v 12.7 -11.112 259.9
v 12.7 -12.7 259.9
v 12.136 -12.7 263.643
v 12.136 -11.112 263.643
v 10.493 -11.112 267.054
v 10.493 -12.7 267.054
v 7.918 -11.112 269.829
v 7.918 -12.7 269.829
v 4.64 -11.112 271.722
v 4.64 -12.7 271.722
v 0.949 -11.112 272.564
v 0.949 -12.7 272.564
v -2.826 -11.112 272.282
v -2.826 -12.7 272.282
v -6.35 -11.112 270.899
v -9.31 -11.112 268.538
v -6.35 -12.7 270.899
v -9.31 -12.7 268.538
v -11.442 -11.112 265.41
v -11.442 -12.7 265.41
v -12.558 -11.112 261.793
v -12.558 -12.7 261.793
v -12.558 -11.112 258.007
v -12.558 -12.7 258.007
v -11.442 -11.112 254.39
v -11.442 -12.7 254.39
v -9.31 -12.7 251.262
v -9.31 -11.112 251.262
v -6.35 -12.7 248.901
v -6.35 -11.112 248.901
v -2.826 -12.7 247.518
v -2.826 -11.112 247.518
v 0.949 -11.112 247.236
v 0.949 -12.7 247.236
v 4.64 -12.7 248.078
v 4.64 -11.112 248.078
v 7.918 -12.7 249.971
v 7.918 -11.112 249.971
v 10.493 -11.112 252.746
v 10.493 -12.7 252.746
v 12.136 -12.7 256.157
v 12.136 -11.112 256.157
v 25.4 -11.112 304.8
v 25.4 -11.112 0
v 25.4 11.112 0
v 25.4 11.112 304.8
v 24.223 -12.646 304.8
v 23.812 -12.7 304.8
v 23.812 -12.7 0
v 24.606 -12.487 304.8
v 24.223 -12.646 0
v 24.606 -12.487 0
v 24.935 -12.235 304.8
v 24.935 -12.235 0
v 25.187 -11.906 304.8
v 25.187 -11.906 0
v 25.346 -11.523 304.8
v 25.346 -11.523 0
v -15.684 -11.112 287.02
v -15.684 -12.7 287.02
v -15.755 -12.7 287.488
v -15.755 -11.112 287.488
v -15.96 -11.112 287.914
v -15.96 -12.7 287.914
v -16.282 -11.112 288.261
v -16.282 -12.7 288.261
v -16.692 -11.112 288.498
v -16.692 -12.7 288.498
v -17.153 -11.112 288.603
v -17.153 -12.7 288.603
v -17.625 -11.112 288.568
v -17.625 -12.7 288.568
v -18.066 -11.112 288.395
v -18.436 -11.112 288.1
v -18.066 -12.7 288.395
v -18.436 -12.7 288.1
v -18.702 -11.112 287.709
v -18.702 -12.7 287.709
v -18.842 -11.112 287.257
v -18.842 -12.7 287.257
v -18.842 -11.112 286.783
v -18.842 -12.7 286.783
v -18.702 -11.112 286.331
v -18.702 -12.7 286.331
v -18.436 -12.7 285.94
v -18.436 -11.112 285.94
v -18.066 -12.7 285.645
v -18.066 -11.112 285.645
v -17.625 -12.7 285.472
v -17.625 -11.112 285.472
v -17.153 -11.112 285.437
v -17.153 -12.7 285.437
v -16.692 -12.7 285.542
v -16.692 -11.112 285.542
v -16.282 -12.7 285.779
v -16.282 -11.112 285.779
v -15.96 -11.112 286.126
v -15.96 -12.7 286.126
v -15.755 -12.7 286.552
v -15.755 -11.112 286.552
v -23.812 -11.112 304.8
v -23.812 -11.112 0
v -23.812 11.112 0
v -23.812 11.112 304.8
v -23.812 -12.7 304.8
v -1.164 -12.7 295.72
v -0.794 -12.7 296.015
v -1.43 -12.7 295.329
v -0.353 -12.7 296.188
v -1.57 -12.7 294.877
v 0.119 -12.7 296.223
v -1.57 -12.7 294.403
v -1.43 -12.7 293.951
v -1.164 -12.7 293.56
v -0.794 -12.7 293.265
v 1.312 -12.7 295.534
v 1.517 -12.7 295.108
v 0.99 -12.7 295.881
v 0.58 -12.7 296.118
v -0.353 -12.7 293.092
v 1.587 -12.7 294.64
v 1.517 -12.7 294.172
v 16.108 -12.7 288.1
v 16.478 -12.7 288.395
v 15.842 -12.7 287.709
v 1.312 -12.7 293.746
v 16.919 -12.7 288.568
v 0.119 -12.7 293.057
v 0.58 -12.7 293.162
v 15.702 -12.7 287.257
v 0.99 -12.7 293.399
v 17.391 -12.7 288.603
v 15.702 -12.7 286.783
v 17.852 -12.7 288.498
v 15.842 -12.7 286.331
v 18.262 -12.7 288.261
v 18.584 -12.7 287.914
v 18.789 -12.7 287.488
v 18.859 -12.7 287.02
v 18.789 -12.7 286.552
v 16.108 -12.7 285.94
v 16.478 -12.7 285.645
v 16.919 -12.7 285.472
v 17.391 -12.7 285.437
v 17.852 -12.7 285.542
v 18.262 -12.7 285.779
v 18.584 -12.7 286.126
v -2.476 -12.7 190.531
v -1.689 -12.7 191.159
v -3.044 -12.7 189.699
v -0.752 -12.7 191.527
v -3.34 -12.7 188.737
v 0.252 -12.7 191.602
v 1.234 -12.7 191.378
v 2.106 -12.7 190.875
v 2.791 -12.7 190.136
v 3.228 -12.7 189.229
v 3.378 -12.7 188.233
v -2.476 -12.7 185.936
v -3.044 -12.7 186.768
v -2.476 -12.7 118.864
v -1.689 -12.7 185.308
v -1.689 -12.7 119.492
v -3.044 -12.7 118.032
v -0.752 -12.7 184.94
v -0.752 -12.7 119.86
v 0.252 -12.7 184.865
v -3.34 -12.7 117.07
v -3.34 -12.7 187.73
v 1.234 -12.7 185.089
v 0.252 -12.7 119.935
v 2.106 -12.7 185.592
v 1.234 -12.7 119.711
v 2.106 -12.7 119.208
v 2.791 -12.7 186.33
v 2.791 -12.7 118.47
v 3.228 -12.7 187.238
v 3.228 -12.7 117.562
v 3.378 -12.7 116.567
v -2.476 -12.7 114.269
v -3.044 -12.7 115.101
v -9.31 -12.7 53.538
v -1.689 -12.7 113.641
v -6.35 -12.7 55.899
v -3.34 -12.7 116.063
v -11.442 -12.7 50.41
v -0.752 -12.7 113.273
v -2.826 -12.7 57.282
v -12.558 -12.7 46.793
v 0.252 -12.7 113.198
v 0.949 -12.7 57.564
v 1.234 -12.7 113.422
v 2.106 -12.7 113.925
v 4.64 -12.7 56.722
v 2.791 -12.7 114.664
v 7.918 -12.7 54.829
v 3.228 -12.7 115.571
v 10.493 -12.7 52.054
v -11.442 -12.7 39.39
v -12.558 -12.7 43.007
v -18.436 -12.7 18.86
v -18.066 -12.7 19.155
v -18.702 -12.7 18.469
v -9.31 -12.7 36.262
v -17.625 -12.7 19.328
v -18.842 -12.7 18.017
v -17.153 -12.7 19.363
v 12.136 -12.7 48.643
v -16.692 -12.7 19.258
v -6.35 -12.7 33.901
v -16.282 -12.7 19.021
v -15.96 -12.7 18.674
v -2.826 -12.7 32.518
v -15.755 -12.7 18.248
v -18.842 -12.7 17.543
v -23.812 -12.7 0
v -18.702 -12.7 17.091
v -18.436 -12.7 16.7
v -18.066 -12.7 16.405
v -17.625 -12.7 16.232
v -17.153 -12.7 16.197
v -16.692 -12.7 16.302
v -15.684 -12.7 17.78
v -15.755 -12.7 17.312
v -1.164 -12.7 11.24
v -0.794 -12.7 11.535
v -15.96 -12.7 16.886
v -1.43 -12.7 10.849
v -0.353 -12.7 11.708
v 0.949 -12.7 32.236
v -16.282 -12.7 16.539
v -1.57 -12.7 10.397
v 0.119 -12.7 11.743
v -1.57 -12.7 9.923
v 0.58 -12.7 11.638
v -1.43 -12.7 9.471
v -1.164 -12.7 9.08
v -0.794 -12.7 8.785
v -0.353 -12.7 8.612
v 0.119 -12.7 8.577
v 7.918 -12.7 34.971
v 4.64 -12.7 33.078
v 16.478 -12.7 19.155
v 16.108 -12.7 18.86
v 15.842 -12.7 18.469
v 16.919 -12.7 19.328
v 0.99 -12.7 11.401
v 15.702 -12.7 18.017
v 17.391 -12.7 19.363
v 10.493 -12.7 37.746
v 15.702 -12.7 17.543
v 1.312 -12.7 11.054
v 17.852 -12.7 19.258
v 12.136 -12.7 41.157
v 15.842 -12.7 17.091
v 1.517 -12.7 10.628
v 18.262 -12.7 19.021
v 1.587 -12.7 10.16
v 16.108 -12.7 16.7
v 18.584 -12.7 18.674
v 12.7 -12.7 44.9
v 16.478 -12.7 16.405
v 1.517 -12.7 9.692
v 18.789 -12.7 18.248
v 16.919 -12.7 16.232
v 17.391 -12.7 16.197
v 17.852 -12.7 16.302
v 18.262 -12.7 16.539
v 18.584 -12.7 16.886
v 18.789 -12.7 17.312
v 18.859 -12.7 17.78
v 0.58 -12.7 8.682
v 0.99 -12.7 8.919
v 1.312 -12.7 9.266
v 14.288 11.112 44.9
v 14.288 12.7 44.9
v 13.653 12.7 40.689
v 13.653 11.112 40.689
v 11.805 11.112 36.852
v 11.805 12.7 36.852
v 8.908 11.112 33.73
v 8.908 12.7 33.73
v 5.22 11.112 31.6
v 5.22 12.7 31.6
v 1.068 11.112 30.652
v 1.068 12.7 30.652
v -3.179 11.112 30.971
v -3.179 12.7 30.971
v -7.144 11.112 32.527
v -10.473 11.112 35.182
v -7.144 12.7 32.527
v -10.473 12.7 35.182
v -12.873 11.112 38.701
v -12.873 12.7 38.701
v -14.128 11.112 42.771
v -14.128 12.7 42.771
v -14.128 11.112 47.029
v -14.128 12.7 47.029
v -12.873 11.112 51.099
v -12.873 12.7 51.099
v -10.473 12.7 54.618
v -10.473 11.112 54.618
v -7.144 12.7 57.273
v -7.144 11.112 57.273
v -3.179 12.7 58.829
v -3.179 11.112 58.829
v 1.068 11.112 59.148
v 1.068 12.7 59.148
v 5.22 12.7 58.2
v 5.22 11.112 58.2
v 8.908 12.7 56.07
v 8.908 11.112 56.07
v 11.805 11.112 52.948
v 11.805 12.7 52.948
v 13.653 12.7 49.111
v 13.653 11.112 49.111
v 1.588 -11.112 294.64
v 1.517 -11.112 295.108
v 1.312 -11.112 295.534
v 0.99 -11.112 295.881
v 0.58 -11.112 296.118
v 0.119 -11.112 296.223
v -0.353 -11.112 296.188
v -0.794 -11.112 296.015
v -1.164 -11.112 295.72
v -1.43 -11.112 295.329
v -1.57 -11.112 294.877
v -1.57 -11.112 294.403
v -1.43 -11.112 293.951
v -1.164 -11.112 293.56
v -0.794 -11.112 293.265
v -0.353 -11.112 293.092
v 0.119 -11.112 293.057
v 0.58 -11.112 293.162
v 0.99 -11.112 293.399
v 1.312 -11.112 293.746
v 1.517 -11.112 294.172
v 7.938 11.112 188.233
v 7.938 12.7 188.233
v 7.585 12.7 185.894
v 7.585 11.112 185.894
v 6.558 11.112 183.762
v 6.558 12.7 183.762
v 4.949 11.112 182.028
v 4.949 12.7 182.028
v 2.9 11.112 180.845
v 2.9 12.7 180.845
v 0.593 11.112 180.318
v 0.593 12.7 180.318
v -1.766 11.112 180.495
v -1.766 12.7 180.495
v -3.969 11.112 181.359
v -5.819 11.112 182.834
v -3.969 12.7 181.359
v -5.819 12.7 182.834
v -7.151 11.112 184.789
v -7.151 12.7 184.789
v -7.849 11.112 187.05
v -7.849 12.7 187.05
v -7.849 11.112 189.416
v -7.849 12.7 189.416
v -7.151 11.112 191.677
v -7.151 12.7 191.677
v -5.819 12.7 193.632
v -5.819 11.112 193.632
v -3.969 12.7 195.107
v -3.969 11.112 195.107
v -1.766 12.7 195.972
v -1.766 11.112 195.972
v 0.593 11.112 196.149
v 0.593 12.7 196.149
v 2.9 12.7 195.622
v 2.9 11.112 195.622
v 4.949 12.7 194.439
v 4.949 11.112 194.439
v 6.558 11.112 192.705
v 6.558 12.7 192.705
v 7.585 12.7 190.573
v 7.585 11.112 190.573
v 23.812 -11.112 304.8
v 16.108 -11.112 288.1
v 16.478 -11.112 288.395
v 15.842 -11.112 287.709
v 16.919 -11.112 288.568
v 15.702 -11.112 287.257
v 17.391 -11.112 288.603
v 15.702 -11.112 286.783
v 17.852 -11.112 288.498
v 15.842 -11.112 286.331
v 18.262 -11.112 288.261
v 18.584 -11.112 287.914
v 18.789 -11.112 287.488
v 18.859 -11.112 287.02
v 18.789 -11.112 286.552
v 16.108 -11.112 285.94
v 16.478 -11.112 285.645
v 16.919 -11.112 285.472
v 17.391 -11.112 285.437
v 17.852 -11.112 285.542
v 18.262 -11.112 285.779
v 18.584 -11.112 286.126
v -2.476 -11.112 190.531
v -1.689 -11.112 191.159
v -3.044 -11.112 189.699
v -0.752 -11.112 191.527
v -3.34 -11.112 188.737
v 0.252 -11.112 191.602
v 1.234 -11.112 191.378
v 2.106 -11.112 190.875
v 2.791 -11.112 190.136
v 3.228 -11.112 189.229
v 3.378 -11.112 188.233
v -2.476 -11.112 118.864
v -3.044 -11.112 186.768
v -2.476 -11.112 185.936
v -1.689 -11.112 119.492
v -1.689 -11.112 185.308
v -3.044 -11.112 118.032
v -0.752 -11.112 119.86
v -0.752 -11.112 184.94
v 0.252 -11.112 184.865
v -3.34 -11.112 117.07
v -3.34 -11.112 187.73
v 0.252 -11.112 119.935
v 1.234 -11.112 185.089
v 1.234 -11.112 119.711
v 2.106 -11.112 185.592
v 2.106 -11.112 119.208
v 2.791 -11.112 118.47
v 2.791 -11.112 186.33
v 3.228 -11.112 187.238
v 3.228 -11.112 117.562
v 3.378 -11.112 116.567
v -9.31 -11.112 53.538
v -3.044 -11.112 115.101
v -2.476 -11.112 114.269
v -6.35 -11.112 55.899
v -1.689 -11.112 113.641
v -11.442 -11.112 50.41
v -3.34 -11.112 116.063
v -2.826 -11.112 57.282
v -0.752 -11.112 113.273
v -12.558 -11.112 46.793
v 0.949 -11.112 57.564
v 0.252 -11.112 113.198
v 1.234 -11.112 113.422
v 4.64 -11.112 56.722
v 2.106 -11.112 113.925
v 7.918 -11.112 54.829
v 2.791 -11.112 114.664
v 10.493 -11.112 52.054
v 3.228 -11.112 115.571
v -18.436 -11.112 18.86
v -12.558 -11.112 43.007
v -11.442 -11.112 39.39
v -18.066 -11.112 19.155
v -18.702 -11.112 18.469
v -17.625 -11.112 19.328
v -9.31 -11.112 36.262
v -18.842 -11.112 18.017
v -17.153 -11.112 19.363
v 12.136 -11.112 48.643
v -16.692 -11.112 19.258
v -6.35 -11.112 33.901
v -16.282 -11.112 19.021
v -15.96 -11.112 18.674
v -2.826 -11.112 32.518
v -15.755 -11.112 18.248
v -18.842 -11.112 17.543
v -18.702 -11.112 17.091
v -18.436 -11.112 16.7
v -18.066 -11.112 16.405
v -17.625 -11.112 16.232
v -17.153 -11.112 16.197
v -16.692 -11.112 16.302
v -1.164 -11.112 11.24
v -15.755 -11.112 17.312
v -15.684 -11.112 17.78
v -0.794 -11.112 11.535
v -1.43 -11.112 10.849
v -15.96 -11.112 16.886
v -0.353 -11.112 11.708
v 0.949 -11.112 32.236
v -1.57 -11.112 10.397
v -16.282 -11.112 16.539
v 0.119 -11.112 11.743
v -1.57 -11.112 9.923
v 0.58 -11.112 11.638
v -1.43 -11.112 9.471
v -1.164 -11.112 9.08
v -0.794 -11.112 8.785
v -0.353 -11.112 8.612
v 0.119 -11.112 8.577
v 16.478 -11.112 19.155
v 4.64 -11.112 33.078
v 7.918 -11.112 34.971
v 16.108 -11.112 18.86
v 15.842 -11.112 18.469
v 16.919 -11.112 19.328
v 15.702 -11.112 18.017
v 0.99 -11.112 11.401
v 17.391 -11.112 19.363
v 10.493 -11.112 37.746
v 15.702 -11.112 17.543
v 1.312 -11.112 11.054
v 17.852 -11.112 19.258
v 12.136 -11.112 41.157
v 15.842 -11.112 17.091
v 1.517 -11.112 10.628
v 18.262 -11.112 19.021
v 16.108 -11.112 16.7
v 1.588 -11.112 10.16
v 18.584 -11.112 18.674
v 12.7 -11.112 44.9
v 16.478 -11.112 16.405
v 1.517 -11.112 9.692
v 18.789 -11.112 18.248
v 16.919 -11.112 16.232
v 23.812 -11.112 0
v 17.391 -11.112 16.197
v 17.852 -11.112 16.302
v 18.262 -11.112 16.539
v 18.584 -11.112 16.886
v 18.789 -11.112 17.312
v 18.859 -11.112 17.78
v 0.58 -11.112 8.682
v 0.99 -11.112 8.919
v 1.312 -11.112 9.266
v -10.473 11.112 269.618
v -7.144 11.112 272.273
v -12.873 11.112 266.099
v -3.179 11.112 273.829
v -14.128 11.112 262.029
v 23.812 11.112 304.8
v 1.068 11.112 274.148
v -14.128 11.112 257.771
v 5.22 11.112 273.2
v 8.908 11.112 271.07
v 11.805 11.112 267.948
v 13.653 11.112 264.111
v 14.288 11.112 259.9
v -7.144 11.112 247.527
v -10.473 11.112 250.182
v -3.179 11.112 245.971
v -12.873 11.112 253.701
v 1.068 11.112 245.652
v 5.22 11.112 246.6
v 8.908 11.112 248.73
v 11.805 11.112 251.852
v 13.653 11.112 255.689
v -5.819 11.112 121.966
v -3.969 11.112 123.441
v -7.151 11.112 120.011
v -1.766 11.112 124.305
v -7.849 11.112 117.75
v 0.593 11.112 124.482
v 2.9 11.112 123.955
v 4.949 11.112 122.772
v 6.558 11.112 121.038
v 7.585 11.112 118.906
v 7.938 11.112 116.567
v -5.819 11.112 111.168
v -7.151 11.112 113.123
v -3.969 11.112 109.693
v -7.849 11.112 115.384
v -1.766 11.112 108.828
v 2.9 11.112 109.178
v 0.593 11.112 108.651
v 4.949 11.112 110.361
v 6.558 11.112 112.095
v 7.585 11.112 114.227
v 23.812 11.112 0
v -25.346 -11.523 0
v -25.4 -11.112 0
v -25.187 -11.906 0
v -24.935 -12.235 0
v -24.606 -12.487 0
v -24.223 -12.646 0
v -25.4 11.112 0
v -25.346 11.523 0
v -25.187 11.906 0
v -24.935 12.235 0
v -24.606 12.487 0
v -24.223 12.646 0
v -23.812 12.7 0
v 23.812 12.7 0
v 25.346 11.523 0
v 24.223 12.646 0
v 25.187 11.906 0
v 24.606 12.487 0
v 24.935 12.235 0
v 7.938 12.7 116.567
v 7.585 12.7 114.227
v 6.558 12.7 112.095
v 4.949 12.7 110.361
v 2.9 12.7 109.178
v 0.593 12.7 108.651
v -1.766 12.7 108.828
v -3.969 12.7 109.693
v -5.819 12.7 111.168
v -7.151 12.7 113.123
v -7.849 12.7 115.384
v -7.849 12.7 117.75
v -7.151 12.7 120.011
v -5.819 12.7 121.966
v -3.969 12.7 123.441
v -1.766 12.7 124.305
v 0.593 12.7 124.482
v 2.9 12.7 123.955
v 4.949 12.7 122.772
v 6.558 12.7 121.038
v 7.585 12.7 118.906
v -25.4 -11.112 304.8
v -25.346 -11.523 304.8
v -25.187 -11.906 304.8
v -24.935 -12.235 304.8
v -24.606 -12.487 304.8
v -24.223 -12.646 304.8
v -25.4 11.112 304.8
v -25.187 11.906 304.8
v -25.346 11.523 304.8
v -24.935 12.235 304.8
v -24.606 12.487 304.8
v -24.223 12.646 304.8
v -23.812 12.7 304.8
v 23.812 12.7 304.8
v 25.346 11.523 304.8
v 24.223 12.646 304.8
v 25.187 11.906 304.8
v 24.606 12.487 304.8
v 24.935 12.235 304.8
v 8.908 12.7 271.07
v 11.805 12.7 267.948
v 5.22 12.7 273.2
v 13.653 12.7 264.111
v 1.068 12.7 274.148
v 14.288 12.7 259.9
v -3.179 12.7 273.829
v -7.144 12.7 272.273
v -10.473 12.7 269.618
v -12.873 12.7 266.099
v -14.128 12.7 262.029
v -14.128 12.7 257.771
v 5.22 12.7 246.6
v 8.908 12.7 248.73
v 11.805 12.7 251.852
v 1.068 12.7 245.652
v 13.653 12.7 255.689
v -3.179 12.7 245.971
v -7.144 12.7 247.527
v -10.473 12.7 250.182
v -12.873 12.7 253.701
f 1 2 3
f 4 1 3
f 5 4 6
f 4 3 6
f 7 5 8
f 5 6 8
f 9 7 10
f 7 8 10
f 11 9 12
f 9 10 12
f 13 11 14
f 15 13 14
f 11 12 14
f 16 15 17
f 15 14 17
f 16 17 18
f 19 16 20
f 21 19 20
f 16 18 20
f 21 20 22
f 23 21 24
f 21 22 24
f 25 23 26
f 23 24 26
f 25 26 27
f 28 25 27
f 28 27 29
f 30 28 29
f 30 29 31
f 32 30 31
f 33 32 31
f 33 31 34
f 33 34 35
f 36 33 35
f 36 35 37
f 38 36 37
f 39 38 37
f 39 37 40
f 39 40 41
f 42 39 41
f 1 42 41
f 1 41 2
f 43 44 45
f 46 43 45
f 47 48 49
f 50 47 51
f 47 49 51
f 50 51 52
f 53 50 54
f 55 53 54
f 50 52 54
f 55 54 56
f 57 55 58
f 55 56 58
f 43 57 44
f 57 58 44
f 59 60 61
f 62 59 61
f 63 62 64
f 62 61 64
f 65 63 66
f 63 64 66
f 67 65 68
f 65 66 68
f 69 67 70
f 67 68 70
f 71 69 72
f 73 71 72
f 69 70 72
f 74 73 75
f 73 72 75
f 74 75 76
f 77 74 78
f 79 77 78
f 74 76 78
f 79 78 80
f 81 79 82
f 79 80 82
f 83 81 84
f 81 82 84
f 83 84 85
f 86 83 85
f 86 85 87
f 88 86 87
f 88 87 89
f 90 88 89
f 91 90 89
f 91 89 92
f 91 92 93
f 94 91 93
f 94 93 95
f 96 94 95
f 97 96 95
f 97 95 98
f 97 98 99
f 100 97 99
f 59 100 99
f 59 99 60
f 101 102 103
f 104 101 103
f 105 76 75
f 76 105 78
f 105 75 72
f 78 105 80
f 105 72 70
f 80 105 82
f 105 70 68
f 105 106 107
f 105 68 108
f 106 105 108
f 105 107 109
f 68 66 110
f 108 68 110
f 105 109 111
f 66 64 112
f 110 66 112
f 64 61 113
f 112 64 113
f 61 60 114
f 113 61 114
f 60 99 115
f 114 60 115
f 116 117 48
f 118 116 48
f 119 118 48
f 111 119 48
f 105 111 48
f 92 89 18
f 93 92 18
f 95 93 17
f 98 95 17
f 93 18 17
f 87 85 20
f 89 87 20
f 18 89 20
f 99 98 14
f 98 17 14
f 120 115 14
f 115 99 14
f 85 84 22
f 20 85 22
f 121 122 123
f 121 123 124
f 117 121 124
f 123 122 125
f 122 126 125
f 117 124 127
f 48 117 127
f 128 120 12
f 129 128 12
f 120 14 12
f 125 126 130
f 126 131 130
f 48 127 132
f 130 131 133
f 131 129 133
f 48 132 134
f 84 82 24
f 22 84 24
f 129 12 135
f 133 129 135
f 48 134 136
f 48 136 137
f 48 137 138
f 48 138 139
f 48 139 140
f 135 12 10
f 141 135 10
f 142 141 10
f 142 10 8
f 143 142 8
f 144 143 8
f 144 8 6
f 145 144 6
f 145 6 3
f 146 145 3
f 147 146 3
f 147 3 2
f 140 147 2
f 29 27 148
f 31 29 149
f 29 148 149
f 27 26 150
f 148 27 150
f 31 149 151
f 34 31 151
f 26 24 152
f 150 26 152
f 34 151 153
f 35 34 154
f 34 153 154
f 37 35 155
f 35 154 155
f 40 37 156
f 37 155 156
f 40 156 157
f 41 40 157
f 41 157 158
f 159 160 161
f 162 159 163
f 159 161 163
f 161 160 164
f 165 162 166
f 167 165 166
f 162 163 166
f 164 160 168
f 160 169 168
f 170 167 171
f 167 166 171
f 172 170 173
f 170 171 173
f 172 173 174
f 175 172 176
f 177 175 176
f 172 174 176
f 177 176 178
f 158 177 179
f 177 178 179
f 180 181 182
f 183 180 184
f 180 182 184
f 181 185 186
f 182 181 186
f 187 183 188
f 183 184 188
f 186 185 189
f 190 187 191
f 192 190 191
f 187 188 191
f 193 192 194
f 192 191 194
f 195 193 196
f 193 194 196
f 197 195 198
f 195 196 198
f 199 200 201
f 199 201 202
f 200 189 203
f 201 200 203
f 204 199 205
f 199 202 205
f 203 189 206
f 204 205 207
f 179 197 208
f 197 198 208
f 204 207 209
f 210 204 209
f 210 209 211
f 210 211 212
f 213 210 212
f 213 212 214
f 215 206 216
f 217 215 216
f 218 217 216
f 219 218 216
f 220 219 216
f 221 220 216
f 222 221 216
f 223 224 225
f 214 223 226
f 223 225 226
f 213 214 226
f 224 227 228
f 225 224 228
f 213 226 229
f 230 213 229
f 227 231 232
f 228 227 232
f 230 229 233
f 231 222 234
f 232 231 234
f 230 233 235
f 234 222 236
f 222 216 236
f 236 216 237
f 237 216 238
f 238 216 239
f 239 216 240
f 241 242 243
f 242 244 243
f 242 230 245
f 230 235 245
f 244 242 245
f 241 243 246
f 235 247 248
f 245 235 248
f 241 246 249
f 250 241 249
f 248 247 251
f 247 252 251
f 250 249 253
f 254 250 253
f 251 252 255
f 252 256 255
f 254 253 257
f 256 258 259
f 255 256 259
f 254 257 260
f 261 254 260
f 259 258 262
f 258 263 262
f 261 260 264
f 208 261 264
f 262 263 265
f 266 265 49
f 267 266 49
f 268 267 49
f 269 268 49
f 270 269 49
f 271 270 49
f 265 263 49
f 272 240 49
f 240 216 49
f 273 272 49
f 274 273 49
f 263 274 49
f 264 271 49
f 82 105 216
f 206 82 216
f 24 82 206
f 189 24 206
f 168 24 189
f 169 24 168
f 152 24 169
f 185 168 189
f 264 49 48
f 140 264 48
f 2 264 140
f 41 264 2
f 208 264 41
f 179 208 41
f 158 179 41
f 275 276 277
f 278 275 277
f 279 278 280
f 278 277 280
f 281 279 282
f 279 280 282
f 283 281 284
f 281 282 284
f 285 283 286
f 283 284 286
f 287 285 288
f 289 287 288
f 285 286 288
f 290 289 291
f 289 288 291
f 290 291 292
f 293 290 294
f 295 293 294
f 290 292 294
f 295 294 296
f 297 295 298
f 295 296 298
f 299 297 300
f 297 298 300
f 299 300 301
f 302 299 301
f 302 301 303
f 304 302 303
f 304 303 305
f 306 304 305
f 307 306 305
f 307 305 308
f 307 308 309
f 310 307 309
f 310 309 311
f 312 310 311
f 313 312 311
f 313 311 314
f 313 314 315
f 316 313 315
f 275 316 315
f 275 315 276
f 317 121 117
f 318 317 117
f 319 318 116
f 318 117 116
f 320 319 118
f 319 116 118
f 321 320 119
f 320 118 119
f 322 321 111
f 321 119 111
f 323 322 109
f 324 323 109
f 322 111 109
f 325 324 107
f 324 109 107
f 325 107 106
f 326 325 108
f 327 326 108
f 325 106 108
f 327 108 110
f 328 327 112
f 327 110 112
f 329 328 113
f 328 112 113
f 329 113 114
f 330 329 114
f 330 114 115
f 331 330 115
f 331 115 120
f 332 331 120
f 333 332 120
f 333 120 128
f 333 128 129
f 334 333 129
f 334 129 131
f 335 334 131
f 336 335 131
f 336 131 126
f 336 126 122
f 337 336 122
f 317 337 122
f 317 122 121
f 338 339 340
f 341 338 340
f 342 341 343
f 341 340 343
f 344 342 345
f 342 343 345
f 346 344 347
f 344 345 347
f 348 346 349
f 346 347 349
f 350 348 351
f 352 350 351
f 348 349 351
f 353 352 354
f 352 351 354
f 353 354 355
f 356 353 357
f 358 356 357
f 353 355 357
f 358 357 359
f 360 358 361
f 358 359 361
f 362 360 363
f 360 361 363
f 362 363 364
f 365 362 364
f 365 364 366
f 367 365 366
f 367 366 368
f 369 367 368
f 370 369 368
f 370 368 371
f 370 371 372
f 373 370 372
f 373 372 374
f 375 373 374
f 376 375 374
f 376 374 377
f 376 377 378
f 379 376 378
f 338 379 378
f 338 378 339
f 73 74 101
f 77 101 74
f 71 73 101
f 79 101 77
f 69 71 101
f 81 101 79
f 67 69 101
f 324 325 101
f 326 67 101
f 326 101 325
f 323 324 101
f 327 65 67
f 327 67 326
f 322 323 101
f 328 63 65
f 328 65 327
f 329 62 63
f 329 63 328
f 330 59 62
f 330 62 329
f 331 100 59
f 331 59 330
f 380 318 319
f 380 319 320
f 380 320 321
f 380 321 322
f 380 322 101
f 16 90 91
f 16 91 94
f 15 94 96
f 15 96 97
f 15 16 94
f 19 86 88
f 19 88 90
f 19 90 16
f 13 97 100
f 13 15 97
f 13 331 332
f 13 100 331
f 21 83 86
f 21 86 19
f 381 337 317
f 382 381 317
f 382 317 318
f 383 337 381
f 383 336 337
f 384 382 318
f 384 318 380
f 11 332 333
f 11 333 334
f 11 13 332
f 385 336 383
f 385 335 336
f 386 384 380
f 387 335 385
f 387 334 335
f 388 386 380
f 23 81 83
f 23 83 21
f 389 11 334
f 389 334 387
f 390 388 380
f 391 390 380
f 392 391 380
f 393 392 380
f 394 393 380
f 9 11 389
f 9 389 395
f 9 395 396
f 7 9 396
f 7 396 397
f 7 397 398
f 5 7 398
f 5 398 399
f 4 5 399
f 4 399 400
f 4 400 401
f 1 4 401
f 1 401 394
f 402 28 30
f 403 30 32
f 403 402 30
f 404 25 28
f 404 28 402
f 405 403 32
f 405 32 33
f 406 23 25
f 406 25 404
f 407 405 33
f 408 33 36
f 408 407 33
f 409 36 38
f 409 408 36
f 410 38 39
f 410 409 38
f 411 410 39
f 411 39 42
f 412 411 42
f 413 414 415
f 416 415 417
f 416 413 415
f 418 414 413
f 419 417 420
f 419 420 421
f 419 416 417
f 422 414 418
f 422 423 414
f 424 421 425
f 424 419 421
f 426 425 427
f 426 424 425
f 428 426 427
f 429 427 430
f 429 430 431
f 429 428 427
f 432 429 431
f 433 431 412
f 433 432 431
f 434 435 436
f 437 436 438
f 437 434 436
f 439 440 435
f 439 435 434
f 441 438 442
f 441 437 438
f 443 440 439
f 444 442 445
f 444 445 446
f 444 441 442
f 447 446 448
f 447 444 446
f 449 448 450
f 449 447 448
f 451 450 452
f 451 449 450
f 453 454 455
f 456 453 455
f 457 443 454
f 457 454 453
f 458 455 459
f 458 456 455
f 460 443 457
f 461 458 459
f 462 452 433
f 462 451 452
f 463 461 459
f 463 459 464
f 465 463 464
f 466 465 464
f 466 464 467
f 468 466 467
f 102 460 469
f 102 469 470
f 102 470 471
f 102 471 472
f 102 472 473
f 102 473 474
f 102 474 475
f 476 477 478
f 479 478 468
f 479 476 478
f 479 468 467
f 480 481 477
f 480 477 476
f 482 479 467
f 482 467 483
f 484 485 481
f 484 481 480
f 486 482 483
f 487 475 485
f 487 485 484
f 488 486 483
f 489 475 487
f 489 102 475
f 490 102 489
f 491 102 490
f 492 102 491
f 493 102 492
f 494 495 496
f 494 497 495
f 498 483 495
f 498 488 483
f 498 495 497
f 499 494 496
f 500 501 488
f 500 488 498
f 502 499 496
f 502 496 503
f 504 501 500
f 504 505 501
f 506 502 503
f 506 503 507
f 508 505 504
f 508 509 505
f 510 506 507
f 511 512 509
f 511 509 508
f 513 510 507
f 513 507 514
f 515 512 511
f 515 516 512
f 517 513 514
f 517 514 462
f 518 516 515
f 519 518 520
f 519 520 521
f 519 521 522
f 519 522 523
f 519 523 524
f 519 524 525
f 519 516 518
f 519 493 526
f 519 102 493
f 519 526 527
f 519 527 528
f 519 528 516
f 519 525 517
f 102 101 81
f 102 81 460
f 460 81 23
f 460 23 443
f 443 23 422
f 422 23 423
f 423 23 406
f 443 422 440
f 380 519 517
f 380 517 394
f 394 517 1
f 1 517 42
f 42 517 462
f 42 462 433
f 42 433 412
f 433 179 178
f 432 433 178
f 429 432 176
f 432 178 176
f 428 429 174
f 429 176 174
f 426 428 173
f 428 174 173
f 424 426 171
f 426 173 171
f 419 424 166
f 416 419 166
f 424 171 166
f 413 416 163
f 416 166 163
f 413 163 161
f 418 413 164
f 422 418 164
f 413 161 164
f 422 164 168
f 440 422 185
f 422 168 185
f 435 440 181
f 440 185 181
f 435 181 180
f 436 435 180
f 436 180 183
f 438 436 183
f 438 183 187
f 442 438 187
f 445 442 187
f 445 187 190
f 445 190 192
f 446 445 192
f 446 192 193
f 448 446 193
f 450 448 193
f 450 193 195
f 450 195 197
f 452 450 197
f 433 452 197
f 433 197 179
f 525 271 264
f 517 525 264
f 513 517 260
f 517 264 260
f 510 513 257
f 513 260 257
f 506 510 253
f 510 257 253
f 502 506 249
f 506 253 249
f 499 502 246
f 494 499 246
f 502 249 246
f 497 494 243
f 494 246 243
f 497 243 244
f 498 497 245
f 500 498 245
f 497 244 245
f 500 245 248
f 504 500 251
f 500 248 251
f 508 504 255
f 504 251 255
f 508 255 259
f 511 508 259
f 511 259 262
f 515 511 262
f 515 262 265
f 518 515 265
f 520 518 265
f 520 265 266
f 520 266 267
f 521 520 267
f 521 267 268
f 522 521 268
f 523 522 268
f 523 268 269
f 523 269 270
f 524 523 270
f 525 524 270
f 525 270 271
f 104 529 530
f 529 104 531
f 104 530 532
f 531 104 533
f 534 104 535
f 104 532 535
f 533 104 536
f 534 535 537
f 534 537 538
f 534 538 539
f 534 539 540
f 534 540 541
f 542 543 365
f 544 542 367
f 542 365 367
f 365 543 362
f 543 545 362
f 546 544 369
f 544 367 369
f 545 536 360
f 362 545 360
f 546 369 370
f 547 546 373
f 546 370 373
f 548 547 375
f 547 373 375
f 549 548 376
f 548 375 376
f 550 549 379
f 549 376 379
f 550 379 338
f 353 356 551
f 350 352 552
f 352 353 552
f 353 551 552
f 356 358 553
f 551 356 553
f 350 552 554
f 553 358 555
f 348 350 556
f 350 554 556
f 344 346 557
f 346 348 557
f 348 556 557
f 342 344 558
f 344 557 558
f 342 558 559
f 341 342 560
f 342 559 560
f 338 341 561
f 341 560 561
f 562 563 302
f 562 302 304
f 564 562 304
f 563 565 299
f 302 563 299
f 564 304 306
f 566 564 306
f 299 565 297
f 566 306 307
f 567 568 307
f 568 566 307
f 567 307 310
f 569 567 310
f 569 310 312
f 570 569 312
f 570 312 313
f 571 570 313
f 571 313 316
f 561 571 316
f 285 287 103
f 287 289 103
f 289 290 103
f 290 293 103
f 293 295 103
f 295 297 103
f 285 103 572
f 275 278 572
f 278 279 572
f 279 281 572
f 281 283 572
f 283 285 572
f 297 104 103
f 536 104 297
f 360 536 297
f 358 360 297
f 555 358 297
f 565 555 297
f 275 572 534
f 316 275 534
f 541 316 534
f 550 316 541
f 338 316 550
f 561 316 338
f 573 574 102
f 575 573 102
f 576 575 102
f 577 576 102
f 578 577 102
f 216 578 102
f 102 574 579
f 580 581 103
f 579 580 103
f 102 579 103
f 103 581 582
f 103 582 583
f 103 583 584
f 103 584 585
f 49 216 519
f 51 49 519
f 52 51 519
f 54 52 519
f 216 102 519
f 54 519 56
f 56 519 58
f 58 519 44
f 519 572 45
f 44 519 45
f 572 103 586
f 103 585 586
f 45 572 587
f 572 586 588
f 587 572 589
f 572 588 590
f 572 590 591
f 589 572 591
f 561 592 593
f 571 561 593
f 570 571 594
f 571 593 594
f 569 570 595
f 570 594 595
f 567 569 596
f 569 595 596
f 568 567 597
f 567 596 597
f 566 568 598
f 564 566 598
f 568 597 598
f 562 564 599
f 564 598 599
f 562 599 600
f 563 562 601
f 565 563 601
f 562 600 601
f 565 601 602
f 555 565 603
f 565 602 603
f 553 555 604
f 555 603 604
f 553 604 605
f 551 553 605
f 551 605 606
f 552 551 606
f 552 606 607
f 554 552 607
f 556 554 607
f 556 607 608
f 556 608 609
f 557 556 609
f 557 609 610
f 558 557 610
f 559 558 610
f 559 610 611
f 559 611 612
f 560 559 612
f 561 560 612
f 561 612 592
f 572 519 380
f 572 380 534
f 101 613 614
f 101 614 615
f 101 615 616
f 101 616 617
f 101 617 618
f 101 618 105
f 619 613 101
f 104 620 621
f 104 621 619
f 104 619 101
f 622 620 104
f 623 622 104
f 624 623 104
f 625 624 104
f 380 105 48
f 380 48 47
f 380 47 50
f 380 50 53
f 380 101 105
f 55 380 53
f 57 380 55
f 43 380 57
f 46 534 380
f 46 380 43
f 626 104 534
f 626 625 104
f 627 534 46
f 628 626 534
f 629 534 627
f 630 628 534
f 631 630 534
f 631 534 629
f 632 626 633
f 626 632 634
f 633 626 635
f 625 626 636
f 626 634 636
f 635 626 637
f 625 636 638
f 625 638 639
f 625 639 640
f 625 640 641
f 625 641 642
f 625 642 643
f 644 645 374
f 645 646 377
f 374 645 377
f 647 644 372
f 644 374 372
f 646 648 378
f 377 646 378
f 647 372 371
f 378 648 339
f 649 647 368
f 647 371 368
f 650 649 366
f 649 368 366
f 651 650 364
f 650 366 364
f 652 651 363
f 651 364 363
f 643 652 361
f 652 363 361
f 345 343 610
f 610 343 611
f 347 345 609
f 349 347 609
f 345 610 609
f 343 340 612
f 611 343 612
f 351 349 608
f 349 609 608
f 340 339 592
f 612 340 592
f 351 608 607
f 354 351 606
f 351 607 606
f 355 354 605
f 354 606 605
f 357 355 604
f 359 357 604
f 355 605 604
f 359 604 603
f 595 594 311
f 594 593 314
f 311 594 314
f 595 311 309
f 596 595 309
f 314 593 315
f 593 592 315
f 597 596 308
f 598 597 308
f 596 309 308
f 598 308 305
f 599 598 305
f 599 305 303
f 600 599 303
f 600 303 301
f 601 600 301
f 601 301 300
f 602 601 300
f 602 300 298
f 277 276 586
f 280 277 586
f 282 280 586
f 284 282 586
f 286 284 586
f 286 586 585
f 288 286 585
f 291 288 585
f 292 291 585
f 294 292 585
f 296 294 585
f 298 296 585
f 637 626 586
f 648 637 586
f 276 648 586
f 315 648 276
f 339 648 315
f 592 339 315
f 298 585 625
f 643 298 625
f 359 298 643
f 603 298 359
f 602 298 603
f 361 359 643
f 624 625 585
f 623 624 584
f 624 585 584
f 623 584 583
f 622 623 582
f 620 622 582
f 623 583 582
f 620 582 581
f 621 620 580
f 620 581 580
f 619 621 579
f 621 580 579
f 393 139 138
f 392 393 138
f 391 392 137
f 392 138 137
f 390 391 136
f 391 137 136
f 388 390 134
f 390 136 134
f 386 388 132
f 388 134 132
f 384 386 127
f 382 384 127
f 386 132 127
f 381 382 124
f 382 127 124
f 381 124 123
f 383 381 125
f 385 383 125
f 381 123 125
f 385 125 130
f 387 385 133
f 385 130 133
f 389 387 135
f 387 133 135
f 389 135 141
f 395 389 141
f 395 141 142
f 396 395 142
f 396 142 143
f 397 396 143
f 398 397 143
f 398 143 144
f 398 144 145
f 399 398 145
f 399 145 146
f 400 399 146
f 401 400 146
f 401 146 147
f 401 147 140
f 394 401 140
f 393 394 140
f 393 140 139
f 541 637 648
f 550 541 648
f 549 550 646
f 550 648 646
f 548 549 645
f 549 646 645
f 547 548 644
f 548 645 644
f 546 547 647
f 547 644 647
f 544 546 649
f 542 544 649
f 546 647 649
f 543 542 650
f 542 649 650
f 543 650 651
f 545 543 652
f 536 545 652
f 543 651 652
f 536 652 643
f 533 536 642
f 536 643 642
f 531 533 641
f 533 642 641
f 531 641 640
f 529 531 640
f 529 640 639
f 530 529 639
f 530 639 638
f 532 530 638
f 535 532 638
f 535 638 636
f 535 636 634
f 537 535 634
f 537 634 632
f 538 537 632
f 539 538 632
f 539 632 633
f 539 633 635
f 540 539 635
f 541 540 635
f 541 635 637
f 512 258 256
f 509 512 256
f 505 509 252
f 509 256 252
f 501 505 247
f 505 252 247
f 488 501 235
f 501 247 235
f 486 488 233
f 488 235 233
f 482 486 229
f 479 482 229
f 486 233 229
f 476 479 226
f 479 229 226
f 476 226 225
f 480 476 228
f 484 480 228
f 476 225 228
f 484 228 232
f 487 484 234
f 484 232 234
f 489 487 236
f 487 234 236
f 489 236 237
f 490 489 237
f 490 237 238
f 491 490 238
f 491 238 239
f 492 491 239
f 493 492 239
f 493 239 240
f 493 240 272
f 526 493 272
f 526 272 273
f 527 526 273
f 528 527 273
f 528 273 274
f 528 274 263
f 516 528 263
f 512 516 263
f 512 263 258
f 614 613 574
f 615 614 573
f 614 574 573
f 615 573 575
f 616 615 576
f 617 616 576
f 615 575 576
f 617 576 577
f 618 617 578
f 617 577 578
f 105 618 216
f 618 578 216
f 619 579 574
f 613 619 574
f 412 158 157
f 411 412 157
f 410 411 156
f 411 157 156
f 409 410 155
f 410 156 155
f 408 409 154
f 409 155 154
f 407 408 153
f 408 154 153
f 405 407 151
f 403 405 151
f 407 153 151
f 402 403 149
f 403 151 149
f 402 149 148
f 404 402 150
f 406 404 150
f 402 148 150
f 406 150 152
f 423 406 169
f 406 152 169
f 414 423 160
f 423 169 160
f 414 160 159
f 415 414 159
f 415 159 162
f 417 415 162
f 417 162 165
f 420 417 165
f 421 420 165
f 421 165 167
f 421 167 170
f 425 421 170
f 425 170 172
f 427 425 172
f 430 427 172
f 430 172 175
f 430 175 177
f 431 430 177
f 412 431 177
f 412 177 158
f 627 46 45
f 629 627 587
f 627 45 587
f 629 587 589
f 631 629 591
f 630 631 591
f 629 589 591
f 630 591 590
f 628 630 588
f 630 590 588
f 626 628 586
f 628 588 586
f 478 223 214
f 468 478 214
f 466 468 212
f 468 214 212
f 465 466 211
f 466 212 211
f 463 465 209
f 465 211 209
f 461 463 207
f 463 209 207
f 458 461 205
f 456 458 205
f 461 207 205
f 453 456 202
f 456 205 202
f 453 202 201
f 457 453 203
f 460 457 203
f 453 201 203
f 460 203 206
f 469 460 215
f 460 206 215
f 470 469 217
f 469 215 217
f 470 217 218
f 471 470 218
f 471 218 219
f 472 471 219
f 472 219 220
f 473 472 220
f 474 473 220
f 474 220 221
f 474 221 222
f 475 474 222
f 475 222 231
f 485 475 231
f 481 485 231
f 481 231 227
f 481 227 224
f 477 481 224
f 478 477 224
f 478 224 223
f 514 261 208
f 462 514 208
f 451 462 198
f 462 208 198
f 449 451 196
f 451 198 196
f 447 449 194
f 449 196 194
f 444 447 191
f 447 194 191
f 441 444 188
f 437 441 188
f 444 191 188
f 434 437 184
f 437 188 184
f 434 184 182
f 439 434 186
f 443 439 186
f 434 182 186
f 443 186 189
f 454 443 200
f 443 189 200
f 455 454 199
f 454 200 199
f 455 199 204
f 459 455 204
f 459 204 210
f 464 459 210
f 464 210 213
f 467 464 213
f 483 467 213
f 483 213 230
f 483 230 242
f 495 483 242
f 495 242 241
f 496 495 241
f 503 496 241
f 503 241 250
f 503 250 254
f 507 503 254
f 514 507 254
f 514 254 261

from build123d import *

# Parameters (mm, degrees)
SKETCH1_W                      = 47.625
SKETCH1_H                      = 22.225
BOSS_EXTRUDE1_DEPTH            = 304.8
CUT_EXTRUDE1_REACH             = 27.4
SKETCH2_R                      = 14.2875
CUT_EXTRUDE1_DIRECTION_2_DEPTH = 1
CUT_EXTRUDE2_REACH             = 27.4
SKETCH3_R                      = 12.7
CUT_EXTRUDE2_DIRECTION_2_DEPTH = 1
CUT_EXTRUDE5_REACH             = 27.4
SKETCH6_R                      = 3.3782
CUT_EXTRUDE5_DIRECTION_2_DEPTH = 1
CUT_EXTRUDE6_REACH             = 27.4
SKETCH7_R                      = 7.9375
CUT_EXTRUDE6_DIRECTION_2_DEPTH = 1
CUT_EXTRUDE7_REACH             = 27.4
SKETCH8_R                      = 1.5875
CUT_EXTRUDE7_DIRECTION_2_DEPTH = 1


with BuildPart() as part:
    # Sketch1 → Boss-Extrude1 (new body)
    with BuildSketch(Plane.XY):
        with BuildLine():
            Line((-23.8125, -12.7), (23.8125, -12.7))
            ThreePointArc((23.8125, -12.7), (24.935032015, -12.235032015), (25.4, -11.1125))
            Line((25.4, -11.1125), (25.4, 11.1125))
            ThreePointArc((25.4, 11.1125), (24.935032015, 12.235032015), (23.8125, 12.7))
            Line((23.8125, 12.7), (-23.8125, 12.7))
            ThreePointArc((-23.8125, 12.7), (-24.935032015, 12.235032015), (-25.4, 11.1125))
            Line((-25.4, 11.1125), (-25.4, -11.1125))
            ThreePointArc((-25.4, -11.1125), (-24.935032015, -12.235032015), (-23.8125, -12.7))
        make_face()
        Rectangle(SKETCH1_W, SKETCH1_H, mode=Mode.SUBTRACT)
    extrude(amount=BOSS_EXTRUDE1_DEPTH)

    # Sketch2 → Cut-Extrude1 (cut, up to next)
    with BuildSketch(Plane(origin=(0, 12.7, 0), x_dir=(1, 0, 0), z_dir=(0, 1, 0)), mode=Mode.PRIVATE) as cut_extrude1_sk1:
        with Locations((0, -259.9)):
            Circle(SKETCH2_R)
    cut_extrude1_tool1 = extrude(cut_extrude1_sk1.sketch, amount=-CUT_EXTRUDE1_REACH, mode=Mode.PRIVATE) & part.part
    add(cut_extrude1_tool1.solids().sort_by_distance((0, 12.7, 259.9))[0], mode=Mode.SUBTRACT)
    # Sketch2 → Cut-Extrude1 (cut, up to next)
    with BuildSketch(Plane(origin=(0, 12.7, 0), x_dir=(1, 0, 0), z_dir=(0, 1, 0)), mode=Mode.PRIVATE) as cut_extrude1_sk2:
        with Locations((0, -44.9)):
            Circle(SKETCH2_R)
    cut_extrude1_tool2 = extrude(cut_extrude1_sk2.sketch, amount=-CUT_EXTRUDE1_REACH, mode=Mode.PRIVATE) & part.part
    add(cut_extrude1_tool2.solids().sort_by_distance((0, 12.7, 44.9))[0], mode=Mode.SUBTRACT)

    # Sketch2 → Cut-Extrude1 direction 2 (cut)
    with BuildSketch(Plane(origin=(0, 12.7, 0), x_dir=(1, 0, 0), z_dir=(0, 1, 0))):
        with Locations((0, -259.9)):
            Circle(SKETCH2_R)
        with Locations((0, -44.9)):
            Circle(SKETCH2_R)
    extrude(amount=CUT_EXTRUDE1_DIRECTION_2_DEPTH, mode=Mode.SUBTRACT)

    # Sketch3 → Cut-Extrude2 (cut, up to next)
    with BuildSketch(Plane.XZ.offset(12.7), mode=Mode.PRIVATE) as cut_extrude2_sk1:
        with Locations((0, 44.9)):
            Circle(SKETCH3_R)
    cut_extrude2_tool1 = extrude(cut_extrude2_sk1.sketch, amount=-CUT_EXTRUDE2_REACH, mode=Mode.PRIVATE) & part.part
    add(cut_extrude2_tool1.solids().sort_by_distance((0, -12.7, 44.9))[0], mode=Mode.SUBTRACT)
    # Sketch3 → Cut-Extrude2 (cut, up to next)
    with BuildSketch(Plane.XZ.offset(12.7), mode=Mode.PRIVATE) as cut_extrude2_sk2:
        with Locations((0, 259.9)):
            Circle(SKETCH3_R)
    cut_extrude2_tool2 = extrude(cut_extrude2_sk2.sketch, amount=-CUT_EXTRUDE2_REACH, mode=Mode.PRIVATE) & part.part
    add(cut_extrude2_tool2.solids().sort_by_distance((0, -12.7, 259.9))[0], mode=Mode.SUBTRACT)

    # Sketch3 → Cut-Extrude2 direction 2 (cut)
    with BuildSketch(Plane.XZ.offset(12.7)):
        with Locations((0, 44.9)):
            Circle(SKETCH3_R)
        with Locations((0, 259.9)):
            Circle(SKETCH3_R)
    extrude(amount=CUT_EXTRUDE2_DIRECTION_2_DEPTH, mode=Mode.SUBTRACT)

    # Sketch6 → Cut-Extrude5 (cut, up to next)
    with BuildSketch(Plane.XZ.offset(12.7), mode=Mode.PRIVATE) as cut_extrude5_sk1:
        with Locations((0, 116.566667182)):
            Circle(SKETCH6_R)
    cut_extrude5_tool1 = extrude(cut_extrude5_sk1.sketch, amount=-CUT_EXTRUDE5_REACH, mode=Mode.PRIVATE) & part.part
    add(cut_extrude5_tool1.solids().sort_by_distance((0, -12.7, 116.566667))[0], mode=Mode.SUBTRACT)
    # Sketch6 → Cut-Extrude5 (cut, up to next)
    with BuildSketch(Plane.XZ.offset(12.7), mode=Mode.PRIVATE) as cut_extrude5_sk2:
        with Locations((0, 188.233332818)):
            Circle(SKETCH6_R)
    cut_extrude5_tool2 = extrude(cut_extrude5_sk2.sketch, amount=-CUT_EXTRUDE5_REACH, mode=Mode.PRIVATE) & part.part
    add(cut_extrude5_tool2.solids().sort_by_distance((0, -12.7, 188.233333))[0], mode=Mode.SUBTRACT)

    # Sketch6 → Cut-Extrude5 direction 2 (cut)
    with BuildSketch(Plane.XZ.offset(12.7)):
        with Locations((0, 116.566667182)):
            Circle(SKETCH6_R)
        with Locations((0, 188.233332818)):
            Circle(SKETCH6_R)
    extrude(amount=CUT_EXTRUDE5_DIRECTION_2_DEPTH, mode=Mode.SUBTRACT)

    # Sketch7 → Cut-Extrude6 (cut, up to next)
    with BuildSketch(Plane(origin=(0, 12.7, 0), x_dir=(1, 0, 0), z_dir=(0, 1, 0)), mode=Mode.PRIVATE) as cut_extrude6_sk1:
        with Locations((0, -116.566667182)):
            Circle(SKETCH7_R)
    cut_extrude6_tool1 = extrude(cut_extrude6_sk1.sketch, amount=-CUT_EXTRUDE6_REACH, mode=Mode.PRIVATE) & part.part
    add(cut_extrude6_tool1.solids().sort_by_distance((0, 12.7, 116.566667))[0], mode=Mode.SUBTRACT)
    # Sketch7 → Cut-Extrude6 (cut, up to next)
    with BuildSketch(Plane(origin=(0, 12.7, 0), x_dir=(1, 0, 0), z_dir=(0, 1, 0)), mode=Mode.PRIVATE) as cut_extrude6_sk2:
        with Locations((0, -188.233332818)):
            Circle(SKETCH7_R)
    cut_extrude6_tool2 = extrude(cut_extrude6_sk2.sketch, amount=-CUT_EXTRUDE6_REACH, mode=Mode.PRIVATE) & part.part
    add(cut_extrude6_tool2.solids().sort_by_distance((0, 12.7, 188.233333))[0], mode=Mode.SUBTRACT)

    # Sketch7 → Cut-Extrude6 direction 2 (cut)
    with BuildSketch(Plane(origin=(0, 12.7, 0), x_dir=(1, 0, 0), z_dir=(0, 1, 0))):
        with Locations((0, -116.566667182)):
            Circle(SKETCH7_R)
        with Locations((0, -188.233332818)):
            Circle(SKETCH7_R)
    extrude(amount=CUT_EXTRUDE6_DIRECTION_2_DEPTH, mode=Mode.SUBTRACT)

    # Sketch8 → Cut-Extrude7 (cut, up to next)
    with BuildSketch(Plane.XZ.offset(12.7), mode=Mode.PRIVATE) as cut_extrude7_sk1:
        with Locations((17.272, 287.02)):
            Circle(SKETCH8_R)
    cut_extrude7_tool1 = extrude(cut_extrude7_sk1.sketch, amount=-CUT_EXTRUDE7_REACH, mode=Mode.PRIVATE) & part.part
    add(cut_extrude7_tool1.solids().sort_by_distance((17.272, -12.7, 287.02))[0], mode=Mode.SUBTRACT)
    # Sketch8 → Cut-Extrude7 (cut, up to next)
    with BuildSketch(Plane.XZ.offset(12.7), mode=Mode.PRIVATE) as cut_extrude7_sk2:
        with Locations((0, 294.64)):
            Circle(SKETCH8_R)
    cut_extrude7_tool2 = extrude(cut_extrude7_sk2.sketch, amount=-CUT_EXTRUDE7_REACH, mode=Mode.PRIVATE) & part.part
    add(cut_extrude7_tool2.solids().sort_by_distance((0, -12.7, 294.64))[0], mode=Mode.SUBTRACT)
    # Sketch8 → Cut-Extrude7 (cut, up to next)
    with BuildSketch(Plane.XZ.offset(12.7), mode=Mode.PRIVATE) as cut_extrude7_sk3:
        with Locations((-17.272, 287.02)):
            Circle(SKETCH8_R)
    cut_extrude7_tool3 = extrude(cut_extrude7_sk3.sketch, amount=-CUT_EXTRUDE7_REACH, mode=Mode.PRIVATE) & part.part
    add(cut_extrude7_tool3.solids().sort_by_distance((-17.272, -12.7, 287.02))[0], mode=Mode.SUBTRACT)
    # Sketch8 → Cut-Extrude7 (cut, up to next)
    with BuildSketch(Plane.XZ.offset(12.7), mode=Mode.PRIVATE) as cut_extrude7_sk4:
        with Locations((-17.272, 17.78)):
            Circle(SKETCH8_R)
    cut_extrude7_tool4 = extrude(cut_extrude7_sk4.sketch, amount=-CUT_EXTRUDE7_REACH, mode=Mode.PRIVATE) & part.part
    add(cut_extrude7_tool4.solids().sort_by_distance((-17.272, -12.7, 17.78))[0], mode=Mode.SUBTRACT)
    # Sketch8 → Cut-Extrude7 (cut, up to next)
    with BuildSketch(Plane.XZ.offset(12.7), mode=Mode.PRIVATE) as cut_extrude7_sk5:
        with Locations((0, 10.16)):
            Circle(SKETCH8_R)
    cut_extrude7_tool5 = extrude(cut_extrude7_sk5.sketch, amount=-CUT_EXTRUDE7_REACH, mode=Mode.PRIVATE) & part.part
    add(cut_extrude7_tool5.solids().sort_by_distance((0, -12.7, 10.16))[0], mode=Mode.SUBTRACT)
    # Sketch8 → Cut-Extrude7 (cut, up to next)
    with BuildSketch(Plane.XZ.offset(12.7), mode=Mode.PRIVATE) as cut_extrude7_sk6:
        with Locations((17.272, 17.78)):
            Circle(SKETCH8_R)
    cut_extrude7_tool6 = extrude(cut_extrude7_sk6.sketch, amount=-CUT_EXTRUDE7_REACH, mode=Mode.PRIVATE) & part.part
    add(cut_extrude7_tool6.solids().sort_by_distance((17.272, -12.7, 17.78))[0], mode=Mode.SUBTRACT)

    # Sketch8 → Cut-Extrude7 direction 2 (cut)
    with BuildSketch(Plane.XZ.offset(12.7)):
        with Locations((17.272, 287.02)):
            Circle(SKETCH8_R)
        with Locations((0, 294.64)):
            Circle(SKETCH8_R)
        with Locations((-17.272, 287.02)):
            Circle(SKETCH8_R)
        with Locations((-17.272, 17.78)):
            Circle(SKETCH8_R)
        with Locations((0, 10.16)):
            Circle(SKETCH8_R)
        with Locations((17.272, 17.78)):
            Circle(SKETCH8_R)
    extrude(amount=CUT_EXTRUDE7_DIRECTION_2_DEPTH, mode=Mode.SUBTRACT)


solid = part.part
